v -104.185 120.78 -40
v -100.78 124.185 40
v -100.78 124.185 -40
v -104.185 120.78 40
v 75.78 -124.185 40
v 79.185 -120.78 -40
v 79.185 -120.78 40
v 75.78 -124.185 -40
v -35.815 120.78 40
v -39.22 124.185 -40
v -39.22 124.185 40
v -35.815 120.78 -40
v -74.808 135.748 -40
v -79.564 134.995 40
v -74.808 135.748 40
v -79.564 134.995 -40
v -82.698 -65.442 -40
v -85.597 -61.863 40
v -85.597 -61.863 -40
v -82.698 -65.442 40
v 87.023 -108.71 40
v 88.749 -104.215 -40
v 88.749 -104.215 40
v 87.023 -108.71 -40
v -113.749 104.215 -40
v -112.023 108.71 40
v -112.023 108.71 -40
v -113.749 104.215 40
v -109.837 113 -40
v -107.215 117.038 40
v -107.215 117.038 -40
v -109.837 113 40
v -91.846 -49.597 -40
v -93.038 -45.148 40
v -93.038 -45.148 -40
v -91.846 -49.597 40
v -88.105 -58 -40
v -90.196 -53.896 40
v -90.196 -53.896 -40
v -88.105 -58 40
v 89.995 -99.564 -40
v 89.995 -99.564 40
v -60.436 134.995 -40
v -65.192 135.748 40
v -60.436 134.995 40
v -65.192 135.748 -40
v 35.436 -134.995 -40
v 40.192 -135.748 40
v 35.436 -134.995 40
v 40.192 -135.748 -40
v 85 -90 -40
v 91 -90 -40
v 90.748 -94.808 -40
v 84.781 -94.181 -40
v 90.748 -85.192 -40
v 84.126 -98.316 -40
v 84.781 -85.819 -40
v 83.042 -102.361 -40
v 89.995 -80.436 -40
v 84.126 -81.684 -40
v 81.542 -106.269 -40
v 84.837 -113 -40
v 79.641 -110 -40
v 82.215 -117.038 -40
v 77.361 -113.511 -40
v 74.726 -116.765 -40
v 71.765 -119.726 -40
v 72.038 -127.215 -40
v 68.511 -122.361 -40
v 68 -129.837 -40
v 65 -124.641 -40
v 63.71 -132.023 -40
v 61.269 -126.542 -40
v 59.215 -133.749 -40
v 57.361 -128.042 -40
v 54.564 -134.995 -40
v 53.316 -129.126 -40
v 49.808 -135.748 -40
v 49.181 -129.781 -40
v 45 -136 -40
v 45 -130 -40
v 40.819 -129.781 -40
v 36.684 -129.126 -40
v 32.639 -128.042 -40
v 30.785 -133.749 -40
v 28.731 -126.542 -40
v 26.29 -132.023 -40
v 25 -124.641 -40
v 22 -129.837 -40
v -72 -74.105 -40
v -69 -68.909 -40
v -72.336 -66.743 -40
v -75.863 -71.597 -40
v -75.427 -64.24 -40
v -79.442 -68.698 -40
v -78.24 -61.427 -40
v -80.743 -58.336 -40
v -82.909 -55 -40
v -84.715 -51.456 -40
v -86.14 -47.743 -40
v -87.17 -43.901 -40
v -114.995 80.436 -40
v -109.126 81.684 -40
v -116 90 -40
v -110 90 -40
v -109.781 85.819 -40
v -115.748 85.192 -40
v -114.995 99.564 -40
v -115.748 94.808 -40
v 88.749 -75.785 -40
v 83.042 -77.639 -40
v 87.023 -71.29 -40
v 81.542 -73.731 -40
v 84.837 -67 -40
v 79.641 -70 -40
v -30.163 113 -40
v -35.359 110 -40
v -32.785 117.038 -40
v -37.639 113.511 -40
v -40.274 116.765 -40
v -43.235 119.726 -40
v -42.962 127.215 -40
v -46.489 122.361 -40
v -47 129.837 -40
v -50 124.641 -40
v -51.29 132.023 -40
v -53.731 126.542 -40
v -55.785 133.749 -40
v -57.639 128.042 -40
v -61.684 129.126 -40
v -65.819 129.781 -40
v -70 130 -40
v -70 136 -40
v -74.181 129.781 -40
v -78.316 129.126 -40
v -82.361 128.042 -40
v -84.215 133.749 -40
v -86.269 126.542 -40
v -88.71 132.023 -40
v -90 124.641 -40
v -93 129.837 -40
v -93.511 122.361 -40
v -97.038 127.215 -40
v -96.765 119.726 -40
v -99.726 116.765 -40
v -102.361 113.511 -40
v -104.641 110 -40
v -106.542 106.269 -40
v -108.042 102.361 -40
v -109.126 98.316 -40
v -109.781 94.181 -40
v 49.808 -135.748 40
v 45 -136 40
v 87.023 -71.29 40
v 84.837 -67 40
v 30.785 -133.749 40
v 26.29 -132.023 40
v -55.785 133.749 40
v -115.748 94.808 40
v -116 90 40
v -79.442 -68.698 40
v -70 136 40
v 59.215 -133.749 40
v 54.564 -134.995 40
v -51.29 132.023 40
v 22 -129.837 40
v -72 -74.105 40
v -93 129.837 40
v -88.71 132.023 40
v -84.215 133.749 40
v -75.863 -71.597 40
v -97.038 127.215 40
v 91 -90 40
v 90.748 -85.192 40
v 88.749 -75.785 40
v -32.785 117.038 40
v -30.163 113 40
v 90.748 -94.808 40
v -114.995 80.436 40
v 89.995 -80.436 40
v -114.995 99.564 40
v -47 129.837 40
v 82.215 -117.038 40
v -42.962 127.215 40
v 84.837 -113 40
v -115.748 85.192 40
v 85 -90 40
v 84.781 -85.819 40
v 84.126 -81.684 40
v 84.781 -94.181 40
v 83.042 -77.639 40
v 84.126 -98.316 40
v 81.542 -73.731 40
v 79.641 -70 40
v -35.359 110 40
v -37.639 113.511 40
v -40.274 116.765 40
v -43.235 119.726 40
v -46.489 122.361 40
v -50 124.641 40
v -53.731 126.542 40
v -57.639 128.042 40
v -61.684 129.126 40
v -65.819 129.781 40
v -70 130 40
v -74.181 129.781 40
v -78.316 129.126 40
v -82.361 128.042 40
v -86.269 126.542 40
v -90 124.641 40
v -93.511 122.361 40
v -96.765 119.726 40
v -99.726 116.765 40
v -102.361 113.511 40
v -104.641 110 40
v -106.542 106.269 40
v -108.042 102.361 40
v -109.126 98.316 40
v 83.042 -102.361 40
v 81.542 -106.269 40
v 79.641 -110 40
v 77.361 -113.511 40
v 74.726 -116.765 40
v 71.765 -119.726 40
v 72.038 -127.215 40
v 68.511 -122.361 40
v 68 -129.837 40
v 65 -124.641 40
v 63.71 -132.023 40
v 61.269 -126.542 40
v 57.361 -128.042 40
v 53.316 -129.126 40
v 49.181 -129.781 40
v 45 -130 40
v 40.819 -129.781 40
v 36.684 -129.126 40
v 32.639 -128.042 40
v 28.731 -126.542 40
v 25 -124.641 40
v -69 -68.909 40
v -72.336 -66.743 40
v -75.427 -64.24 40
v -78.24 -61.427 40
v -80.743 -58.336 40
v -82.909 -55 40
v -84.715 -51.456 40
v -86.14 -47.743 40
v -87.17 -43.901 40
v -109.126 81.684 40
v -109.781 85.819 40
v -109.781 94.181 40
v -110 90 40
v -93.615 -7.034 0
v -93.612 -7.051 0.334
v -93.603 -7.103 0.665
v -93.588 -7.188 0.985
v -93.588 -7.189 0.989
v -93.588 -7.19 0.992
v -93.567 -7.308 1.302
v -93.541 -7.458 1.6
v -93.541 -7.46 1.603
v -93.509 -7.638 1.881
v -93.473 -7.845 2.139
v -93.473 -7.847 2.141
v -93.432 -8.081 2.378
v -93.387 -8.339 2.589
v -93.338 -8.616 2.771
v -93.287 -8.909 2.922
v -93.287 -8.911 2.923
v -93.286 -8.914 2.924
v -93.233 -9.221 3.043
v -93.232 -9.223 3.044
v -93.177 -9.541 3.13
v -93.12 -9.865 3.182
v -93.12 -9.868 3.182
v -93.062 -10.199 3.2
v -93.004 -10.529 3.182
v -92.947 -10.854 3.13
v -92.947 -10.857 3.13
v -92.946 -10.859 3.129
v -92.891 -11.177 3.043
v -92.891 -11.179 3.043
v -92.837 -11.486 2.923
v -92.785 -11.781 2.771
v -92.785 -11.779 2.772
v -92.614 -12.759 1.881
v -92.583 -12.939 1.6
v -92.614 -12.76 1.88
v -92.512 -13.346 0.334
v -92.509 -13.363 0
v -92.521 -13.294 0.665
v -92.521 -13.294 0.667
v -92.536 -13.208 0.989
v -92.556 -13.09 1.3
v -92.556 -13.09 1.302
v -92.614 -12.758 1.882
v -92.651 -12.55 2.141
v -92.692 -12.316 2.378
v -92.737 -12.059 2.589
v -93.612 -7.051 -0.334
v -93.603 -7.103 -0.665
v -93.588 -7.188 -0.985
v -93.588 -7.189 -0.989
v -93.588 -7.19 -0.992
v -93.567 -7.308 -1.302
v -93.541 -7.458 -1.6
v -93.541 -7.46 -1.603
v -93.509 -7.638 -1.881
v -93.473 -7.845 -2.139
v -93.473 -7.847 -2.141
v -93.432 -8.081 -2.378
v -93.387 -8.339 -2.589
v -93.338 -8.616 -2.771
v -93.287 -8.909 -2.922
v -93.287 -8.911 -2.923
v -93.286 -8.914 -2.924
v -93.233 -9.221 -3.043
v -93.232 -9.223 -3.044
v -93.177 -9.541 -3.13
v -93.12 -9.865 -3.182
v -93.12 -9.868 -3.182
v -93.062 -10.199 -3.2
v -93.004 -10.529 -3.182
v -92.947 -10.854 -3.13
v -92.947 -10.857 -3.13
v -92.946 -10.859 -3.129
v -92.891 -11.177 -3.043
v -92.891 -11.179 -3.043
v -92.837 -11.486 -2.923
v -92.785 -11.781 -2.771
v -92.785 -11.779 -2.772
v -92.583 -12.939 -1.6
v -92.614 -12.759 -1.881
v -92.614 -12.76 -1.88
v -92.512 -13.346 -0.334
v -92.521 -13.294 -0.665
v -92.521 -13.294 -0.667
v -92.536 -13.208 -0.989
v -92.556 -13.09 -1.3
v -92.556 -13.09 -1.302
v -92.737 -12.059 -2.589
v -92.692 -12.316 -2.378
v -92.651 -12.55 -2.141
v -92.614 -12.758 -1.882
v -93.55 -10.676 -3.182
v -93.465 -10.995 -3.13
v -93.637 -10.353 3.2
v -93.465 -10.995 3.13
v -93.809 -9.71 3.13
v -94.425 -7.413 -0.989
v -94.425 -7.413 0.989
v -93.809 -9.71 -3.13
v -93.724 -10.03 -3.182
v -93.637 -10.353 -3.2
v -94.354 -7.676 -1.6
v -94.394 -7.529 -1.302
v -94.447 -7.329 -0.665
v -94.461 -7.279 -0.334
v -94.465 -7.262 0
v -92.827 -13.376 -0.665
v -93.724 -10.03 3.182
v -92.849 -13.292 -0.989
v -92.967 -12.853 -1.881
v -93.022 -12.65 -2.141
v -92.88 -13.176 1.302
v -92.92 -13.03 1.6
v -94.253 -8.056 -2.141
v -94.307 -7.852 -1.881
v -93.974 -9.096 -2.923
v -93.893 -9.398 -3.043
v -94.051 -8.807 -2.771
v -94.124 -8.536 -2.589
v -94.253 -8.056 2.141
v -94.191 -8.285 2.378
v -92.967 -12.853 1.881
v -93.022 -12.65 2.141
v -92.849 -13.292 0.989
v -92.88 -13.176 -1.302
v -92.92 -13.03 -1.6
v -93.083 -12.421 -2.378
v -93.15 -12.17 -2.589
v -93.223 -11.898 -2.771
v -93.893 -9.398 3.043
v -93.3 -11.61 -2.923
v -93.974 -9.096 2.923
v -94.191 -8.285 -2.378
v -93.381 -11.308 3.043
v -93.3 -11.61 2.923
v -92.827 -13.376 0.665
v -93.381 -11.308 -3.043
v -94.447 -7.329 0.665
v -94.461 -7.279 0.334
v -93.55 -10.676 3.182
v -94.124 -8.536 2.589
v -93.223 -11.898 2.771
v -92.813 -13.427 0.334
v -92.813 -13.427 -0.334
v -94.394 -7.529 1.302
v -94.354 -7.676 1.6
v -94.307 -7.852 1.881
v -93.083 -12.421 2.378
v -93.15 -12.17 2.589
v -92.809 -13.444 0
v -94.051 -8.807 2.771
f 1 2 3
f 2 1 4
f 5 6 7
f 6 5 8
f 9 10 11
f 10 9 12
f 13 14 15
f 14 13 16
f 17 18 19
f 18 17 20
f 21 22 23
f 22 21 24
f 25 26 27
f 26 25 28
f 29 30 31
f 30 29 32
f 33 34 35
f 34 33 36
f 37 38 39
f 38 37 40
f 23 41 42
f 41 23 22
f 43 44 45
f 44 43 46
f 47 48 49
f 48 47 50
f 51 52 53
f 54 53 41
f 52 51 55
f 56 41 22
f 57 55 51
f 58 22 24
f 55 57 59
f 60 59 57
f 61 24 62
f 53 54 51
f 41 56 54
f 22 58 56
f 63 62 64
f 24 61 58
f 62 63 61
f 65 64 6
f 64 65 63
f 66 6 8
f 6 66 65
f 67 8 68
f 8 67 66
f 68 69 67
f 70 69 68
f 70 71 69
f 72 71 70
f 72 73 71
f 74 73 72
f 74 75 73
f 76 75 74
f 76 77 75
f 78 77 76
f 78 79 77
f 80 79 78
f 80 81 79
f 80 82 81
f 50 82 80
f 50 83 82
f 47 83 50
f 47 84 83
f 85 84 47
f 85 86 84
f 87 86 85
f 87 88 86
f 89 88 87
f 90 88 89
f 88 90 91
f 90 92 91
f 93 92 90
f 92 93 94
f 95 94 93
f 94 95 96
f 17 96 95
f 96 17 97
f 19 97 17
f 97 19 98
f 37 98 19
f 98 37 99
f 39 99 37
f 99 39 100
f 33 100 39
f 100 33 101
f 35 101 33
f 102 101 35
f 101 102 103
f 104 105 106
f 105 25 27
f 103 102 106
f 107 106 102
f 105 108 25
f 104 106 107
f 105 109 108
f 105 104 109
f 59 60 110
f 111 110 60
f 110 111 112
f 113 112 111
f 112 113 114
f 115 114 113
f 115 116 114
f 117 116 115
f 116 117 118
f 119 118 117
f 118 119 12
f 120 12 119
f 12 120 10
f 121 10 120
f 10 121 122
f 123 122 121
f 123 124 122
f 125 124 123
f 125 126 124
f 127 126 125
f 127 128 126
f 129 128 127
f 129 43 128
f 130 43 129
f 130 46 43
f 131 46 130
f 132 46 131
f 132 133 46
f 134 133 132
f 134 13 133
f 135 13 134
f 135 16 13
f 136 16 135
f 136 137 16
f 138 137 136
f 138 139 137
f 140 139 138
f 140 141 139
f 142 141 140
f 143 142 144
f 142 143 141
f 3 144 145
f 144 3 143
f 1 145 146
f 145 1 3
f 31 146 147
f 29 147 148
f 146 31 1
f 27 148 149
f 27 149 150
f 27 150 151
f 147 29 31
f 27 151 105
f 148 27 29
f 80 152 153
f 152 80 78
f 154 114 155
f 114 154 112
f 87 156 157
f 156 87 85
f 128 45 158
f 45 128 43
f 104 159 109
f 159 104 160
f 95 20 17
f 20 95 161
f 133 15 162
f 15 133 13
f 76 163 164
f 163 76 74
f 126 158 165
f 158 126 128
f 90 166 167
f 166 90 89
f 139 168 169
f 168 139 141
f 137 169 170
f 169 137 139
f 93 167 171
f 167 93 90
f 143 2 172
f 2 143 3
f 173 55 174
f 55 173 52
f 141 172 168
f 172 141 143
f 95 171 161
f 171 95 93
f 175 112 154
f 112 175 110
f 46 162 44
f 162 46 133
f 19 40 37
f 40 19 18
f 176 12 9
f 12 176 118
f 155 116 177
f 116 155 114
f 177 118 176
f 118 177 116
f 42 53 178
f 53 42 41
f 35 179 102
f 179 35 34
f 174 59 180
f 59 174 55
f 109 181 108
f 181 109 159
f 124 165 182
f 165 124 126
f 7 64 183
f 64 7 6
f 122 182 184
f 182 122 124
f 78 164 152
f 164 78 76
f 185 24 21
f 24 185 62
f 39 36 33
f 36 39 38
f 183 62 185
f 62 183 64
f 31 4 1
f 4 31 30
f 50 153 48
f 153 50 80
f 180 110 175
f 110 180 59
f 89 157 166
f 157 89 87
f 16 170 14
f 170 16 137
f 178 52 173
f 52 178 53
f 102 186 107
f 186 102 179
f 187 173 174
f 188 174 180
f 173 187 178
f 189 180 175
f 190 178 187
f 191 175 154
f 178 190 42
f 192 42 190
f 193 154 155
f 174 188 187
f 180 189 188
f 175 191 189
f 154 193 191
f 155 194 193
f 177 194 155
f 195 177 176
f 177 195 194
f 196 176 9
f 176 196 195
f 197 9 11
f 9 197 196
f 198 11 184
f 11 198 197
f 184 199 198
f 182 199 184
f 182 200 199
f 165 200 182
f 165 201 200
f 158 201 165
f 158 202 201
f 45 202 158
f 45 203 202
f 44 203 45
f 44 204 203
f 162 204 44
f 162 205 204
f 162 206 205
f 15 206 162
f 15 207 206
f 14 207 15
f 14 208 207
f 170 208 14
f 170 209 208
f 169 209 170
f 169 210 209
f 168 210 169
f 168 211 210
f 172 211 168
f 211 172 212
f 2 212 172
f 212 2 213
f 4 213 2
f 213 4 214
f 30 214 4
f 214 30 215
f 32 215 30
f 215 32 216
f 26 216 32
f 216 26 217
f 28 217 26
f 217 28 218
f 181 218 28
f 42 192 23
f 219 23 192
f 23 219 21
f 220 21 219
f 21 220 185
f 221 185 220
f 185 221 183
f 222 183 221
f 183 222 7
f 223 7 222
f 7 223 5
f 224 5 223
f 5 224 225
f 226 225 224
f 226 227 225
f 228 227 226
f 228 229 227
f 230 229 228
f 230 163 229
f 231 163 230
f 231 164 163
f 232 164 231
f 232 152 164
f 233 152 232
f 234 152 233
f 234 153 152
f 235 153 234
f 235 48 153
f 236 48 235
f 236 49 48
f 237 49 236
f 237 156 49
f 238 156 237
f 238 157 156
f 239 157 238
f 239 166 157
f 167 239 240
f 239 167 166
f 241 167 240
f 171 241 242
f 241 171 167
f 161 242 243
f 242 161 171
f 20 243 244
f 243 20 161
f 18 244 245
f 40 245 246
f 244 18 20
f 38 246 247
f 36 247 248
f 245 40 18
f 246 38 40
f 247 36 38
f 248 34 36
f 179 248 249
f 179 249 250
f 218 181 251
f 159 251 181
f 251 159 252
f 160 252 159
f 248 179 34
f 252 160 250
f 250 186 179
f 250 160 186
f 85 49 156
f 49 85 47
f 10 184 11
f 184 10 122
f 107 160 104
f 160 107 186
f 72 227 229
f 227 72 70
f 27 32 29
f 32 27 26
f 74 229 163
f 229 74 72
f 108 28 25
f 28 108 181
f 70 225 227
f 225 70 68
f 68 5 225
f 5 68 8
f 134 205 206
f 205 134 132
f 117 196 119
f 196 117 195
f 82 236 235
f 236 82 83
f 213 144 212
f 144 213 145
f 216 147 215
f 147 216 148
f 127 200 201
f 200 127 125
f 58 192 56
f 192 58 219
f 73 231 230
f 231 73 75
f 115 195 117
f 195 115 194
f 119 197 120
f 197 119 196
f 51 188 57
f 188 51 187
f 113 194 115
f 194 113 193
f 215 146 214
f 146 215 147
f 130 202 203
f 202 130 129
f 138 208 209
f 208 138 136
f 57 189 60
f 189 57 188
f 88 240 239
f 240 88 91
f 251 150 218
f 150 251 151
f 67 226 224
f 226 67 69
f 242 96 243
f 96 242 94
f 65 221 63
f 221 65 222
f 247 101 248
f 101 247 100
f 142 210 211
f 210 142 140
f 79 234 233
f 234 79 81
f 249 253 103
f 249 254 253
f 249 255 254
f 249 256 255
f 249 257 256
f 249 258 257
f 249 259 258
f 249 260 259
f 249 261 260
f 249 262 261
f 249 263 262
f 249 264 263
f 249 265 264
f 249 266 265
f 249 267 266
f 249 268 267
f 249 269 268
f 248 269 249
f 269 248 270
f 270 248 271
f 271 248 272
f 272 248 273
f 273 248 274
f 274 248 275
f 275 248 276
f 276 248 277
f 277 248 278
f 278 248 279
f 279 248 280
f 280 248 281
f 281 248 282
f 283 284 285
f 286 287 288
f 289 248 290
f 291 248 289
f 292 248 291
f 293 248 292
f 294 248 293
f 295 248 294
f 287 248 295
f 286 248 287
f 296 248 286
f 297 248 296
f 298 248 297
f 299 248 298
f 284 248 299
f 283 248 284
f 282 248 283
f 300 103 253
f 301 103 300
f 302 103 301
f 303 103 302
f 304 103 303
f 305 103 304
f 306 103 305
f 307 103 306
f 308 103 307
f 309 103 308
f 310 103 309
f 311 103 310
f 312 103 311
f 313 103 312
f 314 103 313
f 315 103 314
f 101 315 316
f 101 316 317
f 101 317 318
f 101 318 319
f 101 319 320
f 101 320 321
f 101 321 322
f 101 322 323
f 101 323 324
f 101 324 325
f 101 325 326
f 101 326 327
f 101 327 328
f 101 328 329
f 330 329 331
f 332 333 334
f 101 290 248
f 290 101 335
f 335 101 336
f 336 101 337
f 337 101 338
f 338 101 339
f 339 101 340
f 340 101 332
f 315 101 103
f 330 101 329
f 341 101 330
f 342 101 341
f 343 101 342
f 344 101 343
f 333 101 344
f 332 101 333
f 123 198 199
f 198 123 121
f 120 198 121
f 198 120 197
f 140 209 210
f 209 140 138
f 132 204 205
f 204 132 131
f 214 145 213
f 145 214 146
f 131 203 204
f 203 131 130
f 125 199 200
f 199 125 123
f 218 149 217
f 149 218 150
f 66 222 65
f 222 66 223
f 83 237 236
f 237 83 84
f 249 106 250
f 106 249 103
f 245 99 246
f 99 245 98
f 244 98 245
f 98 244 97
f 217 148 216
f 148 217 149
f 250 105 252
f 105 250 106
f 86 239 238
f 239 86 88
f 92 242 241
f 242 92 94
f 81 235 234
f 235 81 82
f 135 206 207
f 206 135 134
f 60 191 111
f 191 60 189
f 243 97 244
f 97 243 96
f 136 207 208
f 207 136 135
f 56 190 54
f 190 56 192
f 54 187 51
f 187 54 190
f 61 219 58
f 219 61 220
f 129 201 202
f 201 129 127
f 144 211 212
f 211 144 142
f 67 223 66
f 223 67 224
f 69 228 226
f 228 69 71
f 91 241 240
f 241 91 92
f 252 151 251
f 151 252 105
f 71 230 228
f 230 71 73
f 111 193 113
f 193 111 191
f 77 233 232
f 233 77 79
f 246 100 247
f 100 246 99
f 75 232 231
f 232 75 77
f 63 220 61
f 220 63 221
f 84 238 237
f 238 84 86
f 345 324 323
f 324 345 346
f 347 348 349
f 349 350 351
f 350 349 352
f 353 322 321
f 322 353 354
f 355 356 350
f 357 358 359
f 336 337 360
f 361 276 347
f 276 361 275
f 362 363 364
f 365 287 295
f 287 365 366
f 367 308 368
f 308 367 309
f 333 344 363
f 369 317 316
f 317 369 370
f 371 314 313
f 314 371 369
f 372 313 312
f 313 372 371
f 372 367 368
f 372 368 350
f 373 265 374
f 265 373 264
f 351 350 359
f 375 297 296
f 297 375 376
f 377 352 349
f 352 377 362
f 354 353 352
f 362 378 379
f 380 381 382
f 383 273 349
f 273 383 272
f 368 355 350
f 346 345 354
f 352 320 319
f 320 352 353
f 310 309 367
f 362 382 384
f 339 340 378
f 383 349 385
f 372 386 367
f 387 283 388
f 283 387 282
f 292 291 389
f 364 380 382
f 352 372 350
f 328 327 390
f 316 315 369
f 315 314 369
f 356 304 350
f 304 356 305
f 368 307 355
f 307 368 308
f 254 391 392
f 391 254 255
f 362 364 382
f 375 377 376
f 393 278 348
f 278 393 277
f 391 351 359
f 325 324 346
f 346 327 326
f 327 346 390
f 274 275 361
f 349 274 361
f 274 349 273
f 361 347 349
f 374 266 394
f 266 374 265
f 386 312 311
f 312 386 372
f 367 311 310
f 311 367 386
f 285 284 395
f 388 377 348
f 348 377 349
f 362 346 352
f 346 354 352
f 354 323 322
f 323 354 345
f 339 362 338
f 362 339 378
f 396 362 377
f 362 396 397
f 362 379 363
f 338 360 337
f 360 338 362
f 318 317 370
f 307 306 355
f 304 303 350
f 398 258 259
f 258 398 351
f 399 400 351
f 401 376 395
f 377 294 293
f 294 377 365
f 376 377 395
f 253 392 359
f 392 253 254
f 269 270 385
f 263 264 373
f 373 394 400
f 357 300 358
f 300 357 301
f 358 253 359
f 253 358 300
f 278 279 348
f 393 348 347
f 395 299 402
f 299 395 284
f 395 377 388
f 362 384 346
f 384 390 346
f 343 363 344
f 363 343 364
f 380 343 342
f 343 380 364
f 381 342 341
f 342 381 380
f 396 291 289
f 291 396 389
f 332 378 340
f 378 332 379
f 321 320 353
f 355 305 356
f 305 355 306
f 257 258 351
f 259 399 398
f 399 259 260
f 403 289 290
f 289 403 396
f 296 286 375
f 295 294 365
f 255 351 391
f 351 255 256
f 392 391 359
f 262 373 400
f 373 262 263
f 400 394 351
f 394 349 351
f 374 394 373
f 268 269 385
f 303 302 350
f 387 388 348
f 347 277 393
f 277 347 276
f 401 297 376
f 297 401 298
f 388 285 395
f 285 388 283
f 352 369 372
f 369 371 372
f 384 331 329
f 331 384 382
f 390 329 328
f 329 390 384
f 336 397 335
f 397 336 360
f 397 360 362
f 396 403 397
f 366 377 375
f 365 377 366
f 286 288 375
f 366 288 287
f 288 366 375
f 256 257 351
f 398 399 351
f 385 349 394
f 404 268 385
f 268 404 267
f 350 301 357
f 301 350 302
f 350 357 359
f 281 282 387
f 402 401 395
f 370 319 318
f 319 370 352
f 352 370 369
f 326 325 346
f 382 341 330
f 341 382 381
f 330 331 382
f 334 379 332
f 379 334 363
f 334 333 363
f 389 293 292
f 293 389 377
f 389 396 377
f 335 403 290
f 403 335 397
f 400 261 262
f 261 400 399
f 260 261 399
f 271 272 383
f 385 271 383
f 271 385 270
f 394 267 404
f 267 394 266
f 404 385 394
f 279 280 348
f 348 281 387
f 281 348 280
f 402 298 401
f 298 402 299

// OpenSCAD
// ========================================================
// MVP v2 - SUPORTE PÉLVICO PARAMÉTRICO ROBUSTO (SEM ERRO DE MALHA)
// ========================================================

// Qual parte exportar para fatiar? 
// Opções: "esquerdo", "direito", "ambos"
modo_impressao = "esquerdo"; 

// --- Variáveis Antropométricas de Entrada (em mm) ---
largura_biiliaca     = 280; // Distância entre as EIAS
profundidade_sagital = 180; // EIAS até crista posterior
altura_apoio         = 80;  // Altura de contenção vertical
espessura_parede     = 6;   // Espessura sólida para PETG (reforçada)
raio_curvatura       = 40;  // Raio anatômico das cristas

$fn = 60; // Resolução das curvas

module aba_pelvica(lado="esquerdo") {
    sinal = (lado == "esquerdo") ? -1 : 1;
    
    difference() {
        // 1. Corpo Sólido Anatômico do Lado Selecionado
        hull() {
            // Apoio da Crista Ilíaca Anterior (EIAS)
            translate([sinal * (largura_biiliaca/2), 0, 0])
                cylinder(r=raio_curvatura + espessura_parede, h=altura_apoio, center=true);
                
            // Transição Lateral Posterior (abraça o quadril)
            translate([sinal * (largura_biiliaca/2 - 20), -profundidade_sagital * 0.7, 0])
                cylinder(r=raio_curvatura + espessura_parede - 2, h=altura_apoio, center=true);
                
            // Ancoragem Sacral Posterior (apoio de encosto)
            translate([sinal * 25, -profundidade_sagital, 0])
                cylinder(r=raio_curvatura + espessura_parede, h=altura_apoio, center=true);
        }
        
        // 2. Alívio Interno (Cavidade do Corpo + Folga de Almofada EVA)
        hull() {
            translate([sinal * (largura_biiliaca/2), 0, 0])
                cylinder(r=raio_curvatura, h=altura_apoio + 10, center=true);
                
            translate([sinal * (largura_biiliaca/2 - 20), -profundidade_sagital * 0.7, 0])
                cylinder(r=raio_curvatura - 2, h=altura_apoio + 10, center=true);
                
            translate([sinal * 25, -profundidade_sagital, 0])
                cylinder(r=raio_curvatura, h=altura_apoio + 10, center=true);
        }
        
        // 3. Fenda Frontal Reforçada para Cinta de Velcro (50 mm de largura)
        translate([sinal * (largura_biiliaca/2 + 5), 10, 0])
            cube([8, 52, 54], center=true);

        // 4. Fenda Posterior para Cinta Sacral / Acoplamento
        translate([sinal * 45, -profundidade_sagital, 0])
            cube([52, 8, 54], center=true);
            
        // 5. Furação Passante para Parafuso M6 (Fixação no Chassi Metálico)
        translate([sinal * (largura_biiliaca/2 - 15), -profundidade_sagital * 0.5, 0])
            rotate([0, 90, (lado == "esquerdo") ? 15 : -15])
                cylinder(r=3.2, h=80, center=true); // Diâmetro 6.4mm para parafuso M6
    }
}

// Renderização condicional
if (modo_impressao == "esquerdo") {
    // Centraliza o lado esquerdo na origem (perfeito para a placa de impressão)
    translate([largura_biiliaca/4, profundidade_sagital/2, 0])
        aba_pelvica("esquerdo");
} else if (modo_impressao == "direito") {
    // Centraliza o lado direito na origem
    translate([-largura_biiliaca/4, profundidade_sagital/2, 0])
        aba_pelvica("direito");
} else {
    // Ambos juntos
    aba_pelvica("esquerdo");
    aba_pelvica("direito");
}
